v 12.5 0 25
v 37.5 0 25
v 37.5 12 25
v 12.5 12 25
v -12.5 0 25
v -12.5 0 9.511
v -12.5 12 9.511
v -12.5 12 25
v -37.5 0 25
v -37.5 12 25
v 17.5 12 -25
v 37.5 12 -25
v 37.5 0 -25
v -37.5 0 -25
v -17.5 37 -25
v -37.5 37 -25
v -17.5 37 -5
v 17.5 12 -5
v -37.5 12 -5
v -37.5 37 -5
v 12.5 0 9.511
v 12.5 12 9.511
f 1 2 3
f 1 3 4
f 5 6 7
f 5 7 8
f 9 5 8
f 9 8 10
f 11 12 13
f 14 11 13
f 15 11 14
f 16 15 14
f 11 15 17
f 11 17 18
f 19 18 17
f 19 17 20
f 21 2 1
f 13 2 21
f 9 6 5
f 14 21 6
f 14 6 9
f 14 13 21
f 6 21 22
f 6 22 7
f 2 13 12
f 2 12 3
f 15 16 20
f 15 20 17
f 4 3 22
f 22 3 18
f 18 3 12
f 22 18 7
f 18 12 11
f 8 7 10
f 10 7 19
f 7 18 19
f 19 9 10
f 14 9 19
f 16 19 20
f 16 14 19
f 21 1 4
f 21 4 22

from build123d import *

# Parameters (mm, degrees)
BOSS_EXTRUDE1_DEPTH = 12
BOSS_EXTRUDE4_DEPTH = 20


with BuildPart() as part:
    # Sketch2 → Boss-Extrude1 (new body)
    with BuildSketch(Plane(origin=(0, 0, 0), x_dir=(1, 0, 0), z_dir=(0, 1, 0))):
        Polygon((-37.5, 25), (37.5, 25), (37.5, -25), (12.5, -25), (12.5, -9.510869565), (-12.5, -9.510869565), (-12.5, -25), (-37.5, -25), align=None)
    extrude(amount=BOSS_EXTRUDE1_DEPTH)

    # Sketch4 → Boss-Extrude4 (add)
    with BuildSketch(Plane(origin=(0, 0, -25), x_dir=(-1, 0, 0), z_dir=(0, 0, -1))):
        Polygon((37.5, 12), (37.5, 37), (17.5, 37), (-17.5, 12), align=None)
    extrude(amount=-BOSS_EXTRUDE4_DEPTH)


solid = part.part
